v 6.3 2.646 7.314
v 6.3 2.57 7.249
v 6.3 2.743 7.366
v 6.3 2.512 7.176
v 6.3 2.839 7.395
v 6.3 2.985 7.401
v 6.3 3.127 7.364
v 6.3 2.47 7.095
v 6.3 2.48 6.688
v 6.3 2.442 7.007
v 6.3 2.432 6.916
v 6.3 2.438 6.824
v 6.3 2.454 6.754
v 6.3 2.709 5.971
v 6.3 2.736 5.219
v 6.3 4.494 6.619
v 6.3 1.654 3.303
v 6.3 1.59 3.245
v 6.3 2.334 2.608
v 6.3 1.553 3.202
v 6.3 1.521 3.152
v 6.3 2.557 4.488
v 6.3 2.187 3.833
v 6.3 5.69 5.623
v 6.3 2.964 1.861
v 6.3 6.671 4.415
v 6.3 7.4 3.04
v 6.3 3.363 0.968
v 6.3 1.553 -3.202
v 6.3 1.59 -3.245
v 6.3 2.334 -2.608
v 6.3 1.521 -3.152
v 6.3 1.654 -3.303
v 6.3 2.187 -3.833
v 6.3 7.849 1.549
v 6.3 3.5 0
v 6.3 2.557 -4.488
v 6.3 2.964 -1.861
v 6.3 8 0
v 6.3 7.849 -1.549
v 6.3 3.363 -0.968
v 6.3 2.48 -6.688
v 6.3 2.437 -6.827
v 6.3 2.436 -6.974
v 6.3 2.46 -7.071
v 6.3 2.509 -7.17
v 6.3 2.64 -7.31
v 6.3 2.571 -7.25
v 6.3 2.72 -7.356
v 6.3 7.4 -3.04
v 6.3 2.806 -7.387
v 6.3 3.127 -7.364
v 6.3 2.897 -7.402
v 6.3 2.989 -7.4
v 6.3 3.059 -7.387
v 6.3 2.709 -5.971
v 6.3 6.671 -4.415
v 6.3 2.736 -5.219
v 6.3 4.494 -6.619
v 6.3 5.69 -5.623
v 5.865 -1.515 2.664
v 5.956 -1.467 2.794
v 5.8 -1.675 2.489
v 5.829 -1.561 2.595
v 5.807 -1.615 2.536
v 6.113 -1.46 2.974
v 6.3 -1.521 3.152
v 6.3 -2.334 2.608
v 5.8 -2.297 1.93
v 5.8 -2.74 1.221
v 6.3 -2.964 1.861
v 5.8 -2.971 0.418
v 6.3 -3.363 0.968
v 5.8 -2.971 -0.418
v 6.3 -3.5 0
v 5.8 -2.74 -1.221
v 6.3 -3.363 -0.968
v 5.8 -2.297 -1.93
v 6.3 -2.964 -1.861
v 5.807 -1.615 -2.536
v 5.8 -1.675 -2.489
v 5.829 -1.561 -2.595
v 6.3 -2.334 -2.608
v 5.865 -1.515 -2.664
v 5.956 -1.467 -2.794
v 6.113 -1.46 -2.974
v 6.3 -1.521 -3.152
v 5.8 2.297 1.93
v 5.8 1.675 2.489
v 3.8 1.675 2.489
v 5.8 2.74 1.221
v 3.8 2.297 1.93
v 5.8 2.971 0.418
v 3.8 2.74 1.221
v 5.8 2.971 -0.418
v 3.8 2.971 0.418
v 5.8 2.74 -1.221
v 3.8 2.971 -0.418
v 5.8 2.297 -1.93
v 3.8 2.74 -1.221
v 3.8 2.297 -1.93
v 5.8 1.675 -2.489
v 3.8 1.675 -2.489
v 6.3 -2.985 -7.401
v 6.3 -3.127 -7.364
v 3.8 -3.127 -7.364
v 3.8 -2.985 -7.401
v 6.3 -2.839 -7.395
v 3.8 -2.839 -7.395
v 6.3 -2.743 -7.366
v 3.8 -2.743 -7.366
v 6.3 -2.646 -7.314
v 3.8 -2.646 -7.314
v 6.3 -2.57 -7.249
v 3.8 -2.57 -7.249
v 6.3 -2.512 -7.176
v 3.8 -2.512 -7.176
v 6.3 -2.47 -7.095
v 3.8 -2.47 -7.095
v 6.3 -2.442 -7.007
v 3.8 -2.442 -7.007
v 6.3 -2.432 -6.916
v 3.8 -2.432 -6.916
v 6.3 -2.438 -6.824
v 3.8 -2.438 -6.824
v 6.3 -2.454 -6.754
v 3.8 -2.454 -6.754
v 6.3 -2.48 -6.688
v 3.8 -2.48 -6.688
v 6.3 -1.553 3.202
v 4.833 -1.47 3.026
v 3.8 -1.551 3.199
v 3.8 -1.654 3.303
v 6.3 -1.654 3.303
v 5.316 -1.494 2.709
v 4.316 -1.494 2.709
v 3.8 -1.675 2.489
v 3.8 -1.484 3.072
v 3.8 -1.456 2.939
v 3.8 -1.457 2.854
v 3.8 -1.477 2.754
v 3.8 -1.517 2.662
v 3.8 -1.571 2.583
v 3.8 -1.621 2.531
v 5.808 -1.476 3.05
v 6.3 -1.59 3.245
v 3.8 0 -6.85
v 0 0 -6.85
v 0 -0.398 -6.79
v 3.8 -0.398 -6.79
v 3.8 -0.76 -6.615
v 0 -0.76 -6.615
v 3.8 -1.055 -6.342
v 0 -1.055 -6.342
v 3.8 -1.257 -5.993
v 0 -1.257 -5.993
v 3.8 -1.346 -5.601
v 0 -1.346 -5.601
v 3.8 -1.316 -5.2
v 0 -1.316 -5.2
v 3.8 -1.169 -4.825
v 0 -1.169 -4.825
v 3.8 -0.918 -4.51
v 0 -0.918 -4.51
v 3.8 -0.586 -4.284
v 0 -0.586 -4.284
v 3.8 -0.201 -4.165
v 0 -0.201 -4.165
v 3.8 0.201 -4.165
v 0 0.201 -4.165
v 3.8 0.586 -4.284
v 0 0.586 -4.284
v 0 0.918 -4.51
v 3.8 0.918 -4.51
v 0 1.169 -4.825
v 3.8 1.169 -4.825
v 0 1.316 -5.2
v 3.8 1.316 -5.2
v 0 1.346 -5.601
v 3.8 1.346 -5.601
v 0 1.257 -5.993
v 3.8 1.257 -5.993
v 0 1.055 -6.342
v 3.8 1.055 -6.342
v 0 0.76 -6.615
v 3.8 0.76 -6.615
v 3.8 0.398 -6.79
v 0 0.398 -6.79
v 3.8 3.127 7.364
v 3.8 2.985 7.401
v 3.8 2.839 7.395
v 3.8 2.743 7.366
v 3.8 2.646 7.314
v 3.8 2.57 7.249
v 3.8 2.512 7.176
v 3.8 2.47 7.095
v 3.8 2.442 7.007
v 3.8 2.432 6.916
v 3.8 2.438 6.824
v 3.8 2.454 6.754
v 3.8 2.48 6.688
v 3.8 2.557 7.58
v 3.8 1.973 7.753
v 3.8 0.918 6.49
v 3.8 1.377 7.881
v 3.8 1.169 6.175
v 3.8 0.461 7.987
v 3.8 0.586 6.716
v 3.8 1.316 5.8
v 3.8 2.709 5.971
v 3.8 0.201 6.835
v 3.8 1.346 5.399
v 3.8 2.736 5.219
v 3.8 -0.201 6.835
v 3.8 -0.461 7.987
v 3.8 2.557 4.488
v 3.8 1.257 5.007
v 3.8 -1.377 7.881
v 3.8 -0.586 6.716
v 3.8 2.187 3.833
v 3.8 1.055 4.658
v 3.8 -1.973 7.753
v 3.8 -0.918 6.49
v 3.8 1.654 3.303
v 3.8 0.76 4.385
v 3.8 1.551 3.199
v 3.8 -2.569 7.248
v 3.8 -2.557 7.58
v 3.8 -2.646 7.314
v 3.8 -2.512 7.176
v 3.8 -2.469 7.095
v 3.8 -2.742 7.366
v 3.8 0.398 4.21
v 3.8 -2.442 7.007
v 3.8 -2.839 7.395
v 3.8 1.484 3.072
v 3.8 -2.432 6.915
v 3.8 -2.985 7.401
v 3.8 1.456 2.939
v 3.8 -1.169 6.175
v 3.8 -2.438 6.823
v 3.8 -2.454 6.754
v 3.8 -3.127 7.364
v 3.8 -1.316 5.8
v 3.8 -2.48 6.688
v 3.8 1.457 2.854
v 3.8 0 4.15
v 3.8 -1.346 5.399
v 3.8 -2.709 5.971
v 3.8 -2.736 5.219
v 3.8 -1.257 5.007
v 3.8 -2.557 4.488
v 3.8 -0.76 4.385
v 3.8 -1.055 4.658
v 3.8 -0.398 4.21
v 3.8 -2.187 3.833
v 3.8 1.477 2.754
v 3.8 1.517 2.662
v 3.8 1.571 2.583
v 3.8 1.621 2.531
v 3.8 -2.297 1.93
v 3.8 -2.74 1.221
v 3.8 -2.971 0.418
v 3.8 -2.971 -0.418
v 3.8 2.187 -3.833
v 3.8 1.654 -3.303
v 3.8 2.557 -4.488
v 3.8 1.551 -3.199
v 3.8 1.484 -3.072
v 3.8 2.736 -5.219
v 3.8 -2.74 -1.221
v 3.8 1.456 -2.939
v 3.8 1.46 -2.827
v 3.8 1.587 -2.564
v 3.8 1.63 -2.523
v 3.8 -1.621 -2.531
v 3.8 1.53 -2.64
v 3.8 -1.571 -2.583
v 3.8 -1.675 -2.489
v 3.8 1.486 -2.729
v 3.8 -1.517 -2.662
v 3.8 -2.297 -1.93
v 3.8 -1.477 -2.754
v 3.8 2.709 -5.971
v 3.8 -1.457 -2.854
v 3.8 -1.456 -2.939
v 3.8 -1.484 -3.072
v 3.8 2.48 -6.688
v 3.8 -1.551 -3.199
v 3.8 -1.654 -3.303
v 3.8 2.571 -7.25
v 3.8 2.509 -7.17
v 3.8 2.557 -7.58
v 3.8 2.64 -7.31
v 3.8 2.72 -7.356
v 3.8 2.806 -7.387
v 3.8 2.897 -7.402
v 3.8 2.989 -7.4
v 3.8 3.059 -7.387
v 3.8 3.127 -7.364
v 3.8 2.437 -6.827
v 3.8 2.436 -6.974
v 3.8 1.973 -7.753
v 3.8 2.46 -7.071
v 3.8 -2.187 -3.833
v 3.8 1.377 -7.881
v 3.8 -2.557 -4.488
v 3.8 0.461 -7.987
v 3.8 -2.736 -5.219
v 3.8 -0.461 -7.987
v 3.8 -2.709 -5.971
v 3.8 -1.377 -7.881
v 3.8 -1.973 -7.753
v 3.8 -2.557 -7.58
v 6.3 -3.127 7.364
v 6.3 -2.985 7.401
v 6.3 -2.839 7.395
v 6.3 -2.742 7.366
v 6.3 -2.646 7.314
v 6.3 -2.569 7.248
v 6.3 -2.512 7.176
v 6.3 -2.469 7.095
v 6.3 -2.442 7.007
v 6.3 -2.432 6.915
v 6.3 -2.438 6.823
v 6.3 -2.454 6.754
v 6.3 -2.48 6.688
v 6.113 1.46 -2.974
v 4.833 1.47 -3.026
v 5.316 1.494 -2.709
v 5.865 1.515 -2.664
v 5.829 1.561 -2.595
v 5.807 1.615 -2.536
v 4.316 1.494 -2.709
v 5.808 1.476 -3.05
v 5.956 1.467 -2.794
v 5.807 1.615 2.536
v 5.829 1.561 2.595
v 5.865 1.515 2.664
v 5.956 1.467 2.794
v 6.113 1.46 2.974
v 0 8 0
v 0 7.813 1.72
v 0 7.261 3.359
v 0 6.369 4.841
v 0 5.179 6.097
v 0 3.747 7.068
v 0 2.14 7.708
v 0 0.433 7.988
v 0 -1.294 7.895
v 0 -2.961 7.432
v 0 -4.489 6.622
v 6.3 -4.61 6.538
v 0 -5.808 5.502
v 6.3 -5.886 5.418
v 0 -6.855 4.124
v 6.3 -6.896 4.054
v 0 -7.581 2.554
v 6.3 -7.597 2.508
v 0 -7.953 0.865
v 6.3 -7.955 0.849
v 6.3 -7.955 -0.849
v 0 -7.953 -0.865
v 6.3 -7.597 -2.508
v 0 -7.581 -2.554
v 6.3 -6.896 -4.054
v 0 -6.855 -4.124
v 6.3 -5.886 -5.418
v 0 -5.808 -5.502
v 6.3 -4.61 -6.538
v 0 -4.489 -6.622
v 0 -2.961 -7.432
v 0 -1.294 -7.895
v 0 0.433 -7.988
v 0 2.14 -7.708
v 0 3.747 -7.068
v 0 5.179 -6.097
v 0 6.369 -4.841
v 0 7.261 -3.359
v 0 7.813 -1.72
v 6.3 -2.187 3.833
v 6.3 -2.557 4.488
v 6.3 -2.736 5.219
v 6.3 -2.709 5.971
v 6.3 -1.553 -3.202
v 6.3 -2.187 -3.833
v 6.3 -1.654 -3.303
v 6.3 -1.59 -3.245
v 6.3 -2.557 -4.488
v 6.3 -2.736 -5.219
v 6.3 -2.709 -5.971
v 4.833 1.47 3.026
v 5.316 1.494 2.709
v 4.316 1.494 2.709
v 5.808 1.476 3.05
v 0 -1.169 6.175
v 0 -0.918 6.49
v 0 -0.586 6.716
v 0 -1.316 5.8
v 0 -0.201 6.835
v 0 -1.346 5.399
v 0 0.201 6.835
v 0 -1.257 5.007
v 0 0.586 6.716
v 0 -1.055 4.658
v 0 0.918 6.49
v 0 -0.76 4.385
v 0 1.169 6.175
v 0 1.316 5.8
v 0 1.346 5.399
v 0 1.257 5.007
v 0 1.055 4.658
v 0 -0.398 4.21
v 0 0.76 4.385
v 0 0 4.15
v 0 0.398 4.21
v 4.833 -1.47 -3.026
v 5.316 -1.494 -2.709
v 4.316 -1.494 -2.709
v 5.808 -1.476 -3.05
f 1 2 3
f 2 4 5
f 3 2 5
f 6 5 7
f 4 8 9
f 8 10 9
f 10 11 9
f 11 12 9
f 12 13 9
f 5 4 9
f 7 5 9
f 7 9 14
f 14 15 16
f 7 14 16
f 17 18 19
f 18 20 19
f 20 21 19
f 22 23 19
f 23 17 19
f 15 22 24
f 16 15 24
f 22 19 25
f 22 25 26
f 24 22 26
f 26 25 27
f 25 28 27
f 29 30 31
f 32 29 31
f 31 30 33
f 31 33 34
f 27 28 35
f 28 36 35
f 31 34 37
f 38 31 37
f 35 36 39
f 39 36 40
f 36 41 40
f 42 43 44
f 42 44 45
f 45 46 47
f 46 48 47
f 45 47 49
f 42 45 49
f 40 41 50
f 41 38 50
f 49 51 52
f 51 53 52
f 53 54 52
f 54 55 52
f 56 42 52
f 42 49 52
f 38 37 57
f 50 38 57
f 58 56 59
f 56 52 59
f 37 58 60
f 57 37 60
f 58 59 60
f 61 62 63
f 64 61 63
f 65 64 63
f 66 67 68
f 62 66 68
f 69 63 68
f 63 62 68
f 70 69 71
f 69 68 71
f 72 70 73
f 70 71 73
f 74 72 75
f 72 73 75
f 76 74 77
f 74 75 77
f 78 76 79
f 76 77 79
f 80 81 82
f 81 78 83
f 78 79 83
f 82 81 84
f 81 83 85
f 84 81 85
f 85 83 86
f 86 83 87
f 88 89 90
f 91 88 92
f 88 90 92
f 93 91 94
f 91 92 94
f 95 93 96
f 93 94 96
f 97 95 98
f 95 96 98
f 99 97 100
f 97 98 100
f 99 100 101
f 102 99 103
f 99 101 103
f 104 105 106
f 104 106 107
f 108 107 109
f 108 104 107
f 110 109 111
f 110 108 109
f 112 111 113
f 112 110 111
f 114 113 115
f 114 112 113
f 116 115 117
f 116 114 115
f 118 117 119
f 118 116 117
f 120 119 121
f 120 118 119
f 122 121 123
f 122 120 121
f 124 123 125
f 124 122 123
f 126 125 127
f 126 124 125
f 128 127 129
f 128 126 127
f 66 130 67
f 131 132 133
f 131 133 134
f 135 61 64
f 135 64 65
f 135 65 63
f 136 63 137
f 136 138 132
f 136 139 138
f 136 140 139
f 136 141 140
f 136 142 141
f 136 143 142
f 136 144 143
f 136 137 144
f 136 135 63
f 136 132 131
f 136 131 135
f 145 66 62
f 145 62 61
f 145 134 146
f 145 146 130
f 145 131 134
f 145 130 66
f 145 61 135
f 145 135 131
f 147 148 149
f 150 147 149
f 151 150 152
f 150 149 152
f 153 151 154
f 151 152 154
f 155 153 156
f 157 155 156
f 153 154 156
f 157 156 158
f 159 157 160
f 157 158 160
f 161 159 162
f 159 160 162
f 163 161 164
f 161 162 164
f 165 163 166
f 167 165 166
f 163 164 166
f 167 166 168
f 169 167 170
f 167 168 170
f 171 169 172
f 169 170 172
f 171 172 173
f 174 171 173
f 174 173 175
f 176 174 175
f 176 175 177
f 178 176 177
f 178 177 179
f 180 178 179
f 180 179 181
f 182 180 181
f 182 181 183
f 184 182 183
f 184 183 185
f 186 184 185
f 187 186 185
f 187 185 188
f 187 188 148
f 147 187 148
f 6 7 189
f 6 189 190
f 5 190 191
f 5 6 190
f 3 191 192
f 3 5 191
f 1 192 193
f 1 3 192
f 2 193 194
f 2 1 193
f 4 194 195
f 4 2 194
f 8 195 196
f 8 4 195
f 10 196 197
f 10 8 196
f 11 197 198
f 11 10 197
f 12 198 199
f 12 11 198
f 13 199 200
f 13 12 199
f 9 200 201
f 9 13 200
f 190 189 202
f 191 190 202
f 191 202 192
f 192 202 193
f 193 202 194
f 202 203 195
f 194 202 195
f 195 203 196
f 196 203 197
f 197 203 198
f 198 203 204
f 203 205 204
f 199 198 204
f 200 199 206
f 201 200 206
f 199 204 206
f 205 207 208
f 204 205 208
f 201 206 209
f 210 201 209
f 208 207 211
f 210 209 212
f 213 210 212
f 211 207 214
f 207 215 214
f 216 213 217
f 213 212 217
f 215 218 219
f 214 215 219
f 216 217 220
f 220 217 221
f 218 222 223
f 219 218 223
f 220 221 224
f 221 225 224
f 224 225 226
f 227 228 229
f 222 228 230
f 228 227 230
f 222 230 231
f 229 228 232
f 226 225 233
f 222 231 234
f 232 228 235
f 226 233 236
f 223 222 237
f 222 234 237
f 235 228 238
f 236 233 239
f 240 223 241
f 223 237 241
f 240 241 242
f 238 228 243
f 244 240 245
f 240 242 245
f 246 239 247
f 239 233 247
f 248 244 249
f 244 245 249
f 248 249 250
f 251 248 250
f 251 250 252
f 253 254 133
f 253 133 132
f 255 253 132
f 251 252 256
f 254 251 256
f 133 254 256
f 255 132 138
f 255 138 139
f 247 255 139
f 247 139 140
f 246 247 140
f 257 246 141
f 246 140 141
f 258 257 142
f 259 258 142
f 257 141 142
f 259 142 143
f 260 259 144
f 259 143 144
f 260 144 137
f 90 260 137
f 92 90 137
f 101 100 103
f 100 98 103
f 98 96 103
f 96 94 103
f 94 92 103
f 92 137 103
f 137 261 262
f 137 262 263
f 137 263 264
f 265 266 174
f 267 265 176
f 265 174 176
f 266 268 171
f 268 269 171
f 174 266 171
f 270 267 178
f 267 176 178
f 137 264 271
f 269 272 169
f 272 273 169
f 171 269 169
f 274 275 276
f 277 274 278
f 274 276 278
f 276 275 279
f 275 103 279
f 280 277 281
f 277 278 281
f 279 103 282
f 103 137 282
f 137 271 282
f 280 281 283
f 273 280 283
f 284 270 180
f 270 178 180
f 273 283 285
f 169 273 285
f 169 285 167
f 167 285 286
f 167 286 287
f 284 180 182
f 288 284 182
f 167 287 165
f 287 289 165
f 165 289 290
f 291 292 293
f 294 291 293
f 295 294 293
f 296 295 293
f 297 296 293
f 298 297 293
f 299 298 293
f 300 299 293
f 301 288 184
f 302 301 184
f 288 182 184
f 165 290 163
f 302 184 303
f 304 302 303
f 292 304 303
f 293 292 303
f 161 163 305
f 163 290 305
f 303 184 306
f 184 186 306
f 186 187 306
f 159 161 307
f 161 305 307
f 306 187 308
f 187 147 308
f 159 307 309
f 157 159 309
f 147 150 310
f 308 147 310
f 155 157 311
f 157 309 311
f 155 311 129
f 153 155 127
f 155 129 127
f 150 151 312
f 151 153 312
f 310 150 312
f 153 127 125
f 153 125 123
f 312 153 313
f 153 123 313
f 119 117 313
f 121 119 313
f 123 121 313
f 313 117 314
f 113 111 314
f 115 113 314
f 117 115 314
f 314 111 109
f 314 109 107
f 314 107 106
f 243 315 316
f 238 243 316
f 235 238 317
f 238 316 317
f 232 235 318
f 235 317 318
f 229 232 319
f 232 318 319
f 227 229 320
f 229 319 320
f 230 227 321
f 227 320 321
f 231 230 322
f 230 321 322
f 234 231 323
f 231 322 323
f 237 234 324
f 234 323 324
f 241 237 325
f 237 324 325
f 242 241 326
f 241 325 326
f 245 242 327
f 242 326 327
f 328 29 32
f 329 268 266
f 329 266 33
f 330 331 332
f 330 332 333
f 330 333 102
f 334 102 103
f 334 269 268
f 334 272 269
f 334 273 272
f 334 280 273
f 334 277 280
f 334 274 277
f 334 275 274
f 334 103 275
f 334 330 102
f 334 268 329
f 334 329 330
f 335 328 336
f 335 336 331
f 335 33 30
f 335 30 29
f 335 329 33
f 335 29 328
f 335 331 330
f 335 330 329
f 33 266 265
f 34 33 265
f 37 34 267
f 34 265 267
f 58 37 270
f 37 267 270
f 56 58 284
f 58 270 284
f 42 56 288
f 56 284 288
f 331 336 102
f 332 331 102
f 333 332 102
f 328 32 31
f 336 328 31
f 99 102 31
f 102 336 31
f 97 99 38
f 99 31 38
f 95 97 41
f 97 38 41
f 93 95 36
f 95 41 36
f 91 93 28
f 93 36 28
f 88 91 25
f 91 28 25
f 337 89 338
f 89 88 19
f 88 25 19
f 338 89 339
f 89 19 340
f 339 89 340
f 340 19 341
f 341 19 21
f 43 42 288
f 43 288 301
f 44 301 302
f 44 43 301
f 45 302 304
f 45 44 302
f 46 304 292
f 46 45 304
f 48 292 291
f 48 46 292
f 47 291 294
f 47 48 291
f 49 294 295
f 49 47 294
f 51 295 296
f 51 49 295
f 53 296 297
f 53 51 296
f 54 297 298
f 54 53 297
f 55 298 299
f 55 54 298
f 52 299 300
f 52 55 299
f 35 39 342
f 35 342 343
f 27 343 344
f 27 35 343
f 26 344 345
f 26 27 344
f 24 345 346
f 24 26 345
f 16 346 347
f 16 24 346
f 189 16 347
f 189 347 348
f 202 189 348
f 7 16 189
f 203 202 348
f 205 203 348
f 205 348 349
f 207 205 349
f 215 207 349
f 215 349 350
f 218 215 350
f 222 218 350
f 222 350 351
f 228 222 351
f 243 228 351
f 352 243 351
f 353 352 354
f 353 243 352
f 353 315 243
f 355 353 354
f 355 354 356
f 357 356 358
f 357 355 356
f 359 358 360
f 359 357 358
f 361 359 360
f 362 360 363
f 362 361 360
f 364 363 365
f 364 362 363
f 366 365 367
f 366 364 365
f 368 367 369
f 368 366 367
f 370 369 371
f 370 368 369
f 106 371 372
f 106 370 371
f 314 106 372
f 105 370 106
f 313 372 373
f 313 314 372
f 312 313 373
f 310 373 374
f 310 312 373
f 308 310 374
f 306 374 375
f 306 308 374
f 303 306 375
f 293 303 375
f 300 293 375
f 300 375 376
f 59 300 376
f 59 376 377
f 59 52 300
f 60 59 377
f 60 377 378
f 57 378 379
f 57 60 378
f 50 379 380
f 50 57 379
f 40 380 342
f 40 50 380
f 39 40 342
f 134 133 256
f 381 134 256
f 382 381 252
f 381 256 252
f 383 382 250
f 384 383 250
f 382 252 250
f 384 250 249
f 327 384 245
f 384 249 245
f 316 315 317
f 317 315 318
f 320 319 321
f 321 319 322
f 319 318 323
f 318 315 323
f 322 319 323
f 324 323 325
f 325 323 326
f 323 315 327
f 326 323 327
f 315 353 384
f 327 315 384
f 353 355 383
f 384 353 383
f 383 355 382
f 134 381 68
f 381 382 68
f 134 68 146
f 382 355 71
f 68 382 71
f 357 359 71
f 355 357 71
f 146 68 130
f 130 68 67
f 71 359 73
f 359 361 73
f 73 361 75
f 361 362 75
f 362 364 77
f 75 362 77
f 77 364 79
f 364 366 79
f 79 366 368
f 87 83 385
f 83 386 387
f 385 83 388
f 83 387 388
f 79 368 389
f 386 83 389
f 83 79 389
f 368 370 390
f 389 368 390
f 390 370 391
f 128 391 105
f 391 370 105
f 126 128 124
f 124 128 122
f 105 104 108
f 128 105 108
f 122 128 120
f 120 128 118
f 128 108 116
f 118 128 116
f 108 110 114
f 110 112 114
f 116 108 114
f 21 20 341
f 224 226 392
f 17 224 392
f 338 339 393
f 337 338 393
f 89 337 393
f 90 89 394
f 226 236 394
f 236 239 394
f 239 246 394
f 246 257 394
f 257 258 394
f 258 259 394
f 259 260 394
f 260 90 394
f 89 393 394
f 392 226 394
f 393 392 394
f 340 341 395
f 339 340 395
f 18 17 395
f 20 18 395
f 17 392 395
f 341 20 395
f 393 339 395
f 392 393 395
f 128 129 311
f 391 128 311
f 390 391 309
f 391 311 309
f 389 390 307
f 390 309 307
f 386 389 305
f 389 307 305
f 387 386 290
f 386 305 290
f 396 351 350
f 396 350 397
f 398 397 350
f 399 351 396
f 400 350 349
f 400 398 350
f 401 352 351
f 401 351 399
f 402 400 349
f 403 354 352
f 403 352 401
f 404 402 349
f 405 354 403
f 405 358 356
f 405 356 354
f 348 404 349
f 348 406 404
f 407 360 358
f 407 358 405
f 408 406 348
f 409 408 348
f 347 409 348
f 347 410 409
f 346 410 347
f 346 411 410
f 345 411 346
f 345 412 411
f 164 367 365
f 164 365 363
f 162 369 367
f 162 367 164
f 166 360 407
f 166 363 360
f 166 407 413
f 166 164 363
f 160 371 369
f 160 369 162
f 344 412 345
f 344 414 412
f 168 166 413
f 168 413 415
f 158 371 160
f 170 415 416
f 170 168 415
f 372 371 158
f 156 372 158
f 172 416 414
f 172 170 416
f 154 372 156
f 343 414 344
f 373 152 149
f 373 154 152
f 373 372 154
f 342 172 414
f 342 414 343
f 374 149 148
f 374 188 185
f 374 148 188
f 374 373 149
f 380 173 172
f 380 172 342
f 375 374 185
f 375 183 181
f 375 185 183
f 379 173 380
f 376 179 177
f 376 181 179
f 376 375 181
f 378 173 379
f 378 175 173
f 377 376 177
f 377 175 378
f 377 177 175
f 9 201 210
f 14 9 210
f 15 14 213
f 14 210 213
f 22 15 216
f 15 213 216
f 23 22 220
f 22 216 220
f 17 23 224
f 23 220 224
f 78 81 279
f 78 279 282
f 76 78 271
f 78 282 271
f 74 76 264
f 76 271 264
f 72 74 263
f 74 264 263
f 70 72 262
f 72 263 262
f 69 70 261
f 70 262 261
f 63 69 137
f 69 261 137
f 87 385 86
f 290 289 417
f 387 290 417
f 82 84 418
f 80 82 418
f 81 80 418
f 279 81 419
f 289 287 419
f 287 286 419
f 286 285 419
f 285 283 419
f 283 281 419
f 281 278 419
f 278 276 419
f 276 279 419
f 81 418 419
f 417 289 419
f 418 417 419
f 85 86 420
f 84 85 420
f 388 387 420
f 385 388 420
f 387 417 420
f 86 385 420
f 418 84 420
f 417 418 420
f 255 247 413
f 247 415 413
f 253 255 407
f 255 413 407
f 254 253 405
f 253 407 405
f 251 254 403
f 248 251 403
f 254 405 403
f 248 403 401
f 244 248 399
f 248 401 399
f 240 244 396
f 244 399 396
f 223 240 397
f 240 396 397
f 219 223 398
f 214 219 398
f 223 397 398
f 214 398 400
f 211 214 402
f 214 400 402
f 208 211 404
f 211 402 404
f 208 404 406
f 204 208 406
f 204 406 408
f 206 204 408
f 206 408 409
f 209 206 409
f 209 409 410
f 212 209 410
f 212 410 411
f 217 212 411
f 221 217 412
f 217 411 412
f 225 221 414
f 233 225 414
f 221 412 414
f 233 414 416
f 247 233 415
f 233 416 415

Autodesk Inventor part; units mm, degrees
ref_plane "YZ Plane" through (0, 0, 0) normal (1, 0, 0) x (0, 1, 0)
ref_plane "XZ Plane" through (0, 0, 0) normal (0, 1, 0) x (-1, 0, 0)
ref_plane "XY Plane" through (0, 0, 0) normal (0, 0, 1) x (1, 0, 0)
sketch "スケッチ1" plane through (0, 0, 0) normal (0, 0, 1) x (1, 0, 0)
  line L0 (0, 0) -> (0, 3.5)
  line L1 (0, 3.5) -> (0, 3.5)
  line L2 (0, 3.5) -> (0, 8)
  line L3 (0, 8) -> (6.3, 8)
  line L4 (6.3, 8) -> (6.3, 3)
  line L5 (6.3, 3) -> (3.8, 3)
  line L6 (3.8, 3) -> (3.8, 0)
  line L7 (3.8, 0) -> (0, 0)
  dimension "d0" = 3.5
  dimension "d1" = 3
  dimension "d2" = 2.5
  dimension "d4" = 0
  dimension "d5" = 8
  dimension "d34" = 3.8
revolve "回転1" add sketch "スケッチ1" angle 360 about axis through (3.8, 0, 0) along (-1, 0, 0)
sketch "スケッチ2" plane through (6.3, 0, 0) normal (1, 0, 0) x (0, 0, -1)
  point P0 (0, 0)
  point P1 (-5.5, 0)
  point P2 (5.5, 0)
  dimension "d10" = 5.5
  dimension "d11" = 5.5
hole "穴1" at (6.3, 0, 5.5) at (6.3, 0, -5.5) direction (-1, 0, 0) diameter 2.7 end through all counterbore diameter 5.5 counterbore depth 2.5 clearance for "Socket Head Cap Screw" size "M2.5" standard "Ansi Metric M Profile"
chamfer "面取り5" distance 0.5 angle 45 2 edges at (6.3, 3, 0) (6.3, -3, 0)
fillet "フィレット2" radius 0.5 8 edges at (4.8, 0.8377, -2.8807) (4.8, 0.8377, 2.8807) (4.8, -0.8377, 2.8807) (4.8, -0.8377, -2.8807) (5.05, 1.3765, -7.8807) (5.05, 1.3765, 7.8807) (5.05, -1.3765, 7.8807) (5.05, -1.3765, -7.8807)
properties part number "unit-base4" material "ABS プラスチック"
